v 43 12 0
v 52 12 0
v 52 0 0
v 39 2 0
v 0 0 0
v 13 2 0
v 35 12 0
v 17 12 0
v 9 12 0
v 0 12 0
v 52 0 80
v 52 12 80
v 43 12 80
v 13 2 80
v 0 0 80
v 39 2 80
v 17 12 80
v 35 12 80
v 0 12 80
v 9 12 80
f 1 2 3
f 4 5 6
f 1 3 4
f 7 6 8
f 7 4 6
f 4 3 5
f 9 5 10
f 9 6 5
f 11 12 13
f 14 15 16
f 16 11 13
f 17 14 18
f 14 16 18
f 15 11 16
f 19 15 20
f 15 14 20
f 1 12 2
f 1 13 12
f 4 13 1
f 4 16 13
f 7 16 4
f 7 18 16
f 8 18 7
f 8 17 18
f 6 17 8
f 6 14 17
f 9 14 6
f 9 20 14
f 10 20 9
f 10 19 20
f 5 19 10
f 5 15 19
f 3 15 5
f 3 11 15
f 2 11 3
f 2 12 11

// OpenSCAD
$fn = 32;

// ----------------------------------------------------------------------
// V guide rail: doublev, 52 mm wide
// ----------------------------------------------------------------------

// --- parameters (mm) ---
rail_w = 52;              // rail width, X
base_t = 12;              // base plate thickness
v_depth = 10;             // V feature depth / height
v_half_w = 8;             // half width of the V at the base face
plate_t = 80;             // rail length, Z (the extrusion height)
groove_off = 13;          // offset of each groove from the centreline

centre_x = rail_w / 2;  // rail centreline
groove_a = centre_x - groove_off;  // axis of the first groove
groove_b = centre_x + groove_off;  // axis of the second groove

profile = [[0, 0], [52, 0], [52, 12], [43, 12], [39, 2], [35, 12], [17, 12], [13, 2], [9, 12], [0, 12]];  // primary outline, 10 points, counter clockwise

// --- the one profile operation ---
linear_extrude(height = plate_t) polygon(points = profile);
